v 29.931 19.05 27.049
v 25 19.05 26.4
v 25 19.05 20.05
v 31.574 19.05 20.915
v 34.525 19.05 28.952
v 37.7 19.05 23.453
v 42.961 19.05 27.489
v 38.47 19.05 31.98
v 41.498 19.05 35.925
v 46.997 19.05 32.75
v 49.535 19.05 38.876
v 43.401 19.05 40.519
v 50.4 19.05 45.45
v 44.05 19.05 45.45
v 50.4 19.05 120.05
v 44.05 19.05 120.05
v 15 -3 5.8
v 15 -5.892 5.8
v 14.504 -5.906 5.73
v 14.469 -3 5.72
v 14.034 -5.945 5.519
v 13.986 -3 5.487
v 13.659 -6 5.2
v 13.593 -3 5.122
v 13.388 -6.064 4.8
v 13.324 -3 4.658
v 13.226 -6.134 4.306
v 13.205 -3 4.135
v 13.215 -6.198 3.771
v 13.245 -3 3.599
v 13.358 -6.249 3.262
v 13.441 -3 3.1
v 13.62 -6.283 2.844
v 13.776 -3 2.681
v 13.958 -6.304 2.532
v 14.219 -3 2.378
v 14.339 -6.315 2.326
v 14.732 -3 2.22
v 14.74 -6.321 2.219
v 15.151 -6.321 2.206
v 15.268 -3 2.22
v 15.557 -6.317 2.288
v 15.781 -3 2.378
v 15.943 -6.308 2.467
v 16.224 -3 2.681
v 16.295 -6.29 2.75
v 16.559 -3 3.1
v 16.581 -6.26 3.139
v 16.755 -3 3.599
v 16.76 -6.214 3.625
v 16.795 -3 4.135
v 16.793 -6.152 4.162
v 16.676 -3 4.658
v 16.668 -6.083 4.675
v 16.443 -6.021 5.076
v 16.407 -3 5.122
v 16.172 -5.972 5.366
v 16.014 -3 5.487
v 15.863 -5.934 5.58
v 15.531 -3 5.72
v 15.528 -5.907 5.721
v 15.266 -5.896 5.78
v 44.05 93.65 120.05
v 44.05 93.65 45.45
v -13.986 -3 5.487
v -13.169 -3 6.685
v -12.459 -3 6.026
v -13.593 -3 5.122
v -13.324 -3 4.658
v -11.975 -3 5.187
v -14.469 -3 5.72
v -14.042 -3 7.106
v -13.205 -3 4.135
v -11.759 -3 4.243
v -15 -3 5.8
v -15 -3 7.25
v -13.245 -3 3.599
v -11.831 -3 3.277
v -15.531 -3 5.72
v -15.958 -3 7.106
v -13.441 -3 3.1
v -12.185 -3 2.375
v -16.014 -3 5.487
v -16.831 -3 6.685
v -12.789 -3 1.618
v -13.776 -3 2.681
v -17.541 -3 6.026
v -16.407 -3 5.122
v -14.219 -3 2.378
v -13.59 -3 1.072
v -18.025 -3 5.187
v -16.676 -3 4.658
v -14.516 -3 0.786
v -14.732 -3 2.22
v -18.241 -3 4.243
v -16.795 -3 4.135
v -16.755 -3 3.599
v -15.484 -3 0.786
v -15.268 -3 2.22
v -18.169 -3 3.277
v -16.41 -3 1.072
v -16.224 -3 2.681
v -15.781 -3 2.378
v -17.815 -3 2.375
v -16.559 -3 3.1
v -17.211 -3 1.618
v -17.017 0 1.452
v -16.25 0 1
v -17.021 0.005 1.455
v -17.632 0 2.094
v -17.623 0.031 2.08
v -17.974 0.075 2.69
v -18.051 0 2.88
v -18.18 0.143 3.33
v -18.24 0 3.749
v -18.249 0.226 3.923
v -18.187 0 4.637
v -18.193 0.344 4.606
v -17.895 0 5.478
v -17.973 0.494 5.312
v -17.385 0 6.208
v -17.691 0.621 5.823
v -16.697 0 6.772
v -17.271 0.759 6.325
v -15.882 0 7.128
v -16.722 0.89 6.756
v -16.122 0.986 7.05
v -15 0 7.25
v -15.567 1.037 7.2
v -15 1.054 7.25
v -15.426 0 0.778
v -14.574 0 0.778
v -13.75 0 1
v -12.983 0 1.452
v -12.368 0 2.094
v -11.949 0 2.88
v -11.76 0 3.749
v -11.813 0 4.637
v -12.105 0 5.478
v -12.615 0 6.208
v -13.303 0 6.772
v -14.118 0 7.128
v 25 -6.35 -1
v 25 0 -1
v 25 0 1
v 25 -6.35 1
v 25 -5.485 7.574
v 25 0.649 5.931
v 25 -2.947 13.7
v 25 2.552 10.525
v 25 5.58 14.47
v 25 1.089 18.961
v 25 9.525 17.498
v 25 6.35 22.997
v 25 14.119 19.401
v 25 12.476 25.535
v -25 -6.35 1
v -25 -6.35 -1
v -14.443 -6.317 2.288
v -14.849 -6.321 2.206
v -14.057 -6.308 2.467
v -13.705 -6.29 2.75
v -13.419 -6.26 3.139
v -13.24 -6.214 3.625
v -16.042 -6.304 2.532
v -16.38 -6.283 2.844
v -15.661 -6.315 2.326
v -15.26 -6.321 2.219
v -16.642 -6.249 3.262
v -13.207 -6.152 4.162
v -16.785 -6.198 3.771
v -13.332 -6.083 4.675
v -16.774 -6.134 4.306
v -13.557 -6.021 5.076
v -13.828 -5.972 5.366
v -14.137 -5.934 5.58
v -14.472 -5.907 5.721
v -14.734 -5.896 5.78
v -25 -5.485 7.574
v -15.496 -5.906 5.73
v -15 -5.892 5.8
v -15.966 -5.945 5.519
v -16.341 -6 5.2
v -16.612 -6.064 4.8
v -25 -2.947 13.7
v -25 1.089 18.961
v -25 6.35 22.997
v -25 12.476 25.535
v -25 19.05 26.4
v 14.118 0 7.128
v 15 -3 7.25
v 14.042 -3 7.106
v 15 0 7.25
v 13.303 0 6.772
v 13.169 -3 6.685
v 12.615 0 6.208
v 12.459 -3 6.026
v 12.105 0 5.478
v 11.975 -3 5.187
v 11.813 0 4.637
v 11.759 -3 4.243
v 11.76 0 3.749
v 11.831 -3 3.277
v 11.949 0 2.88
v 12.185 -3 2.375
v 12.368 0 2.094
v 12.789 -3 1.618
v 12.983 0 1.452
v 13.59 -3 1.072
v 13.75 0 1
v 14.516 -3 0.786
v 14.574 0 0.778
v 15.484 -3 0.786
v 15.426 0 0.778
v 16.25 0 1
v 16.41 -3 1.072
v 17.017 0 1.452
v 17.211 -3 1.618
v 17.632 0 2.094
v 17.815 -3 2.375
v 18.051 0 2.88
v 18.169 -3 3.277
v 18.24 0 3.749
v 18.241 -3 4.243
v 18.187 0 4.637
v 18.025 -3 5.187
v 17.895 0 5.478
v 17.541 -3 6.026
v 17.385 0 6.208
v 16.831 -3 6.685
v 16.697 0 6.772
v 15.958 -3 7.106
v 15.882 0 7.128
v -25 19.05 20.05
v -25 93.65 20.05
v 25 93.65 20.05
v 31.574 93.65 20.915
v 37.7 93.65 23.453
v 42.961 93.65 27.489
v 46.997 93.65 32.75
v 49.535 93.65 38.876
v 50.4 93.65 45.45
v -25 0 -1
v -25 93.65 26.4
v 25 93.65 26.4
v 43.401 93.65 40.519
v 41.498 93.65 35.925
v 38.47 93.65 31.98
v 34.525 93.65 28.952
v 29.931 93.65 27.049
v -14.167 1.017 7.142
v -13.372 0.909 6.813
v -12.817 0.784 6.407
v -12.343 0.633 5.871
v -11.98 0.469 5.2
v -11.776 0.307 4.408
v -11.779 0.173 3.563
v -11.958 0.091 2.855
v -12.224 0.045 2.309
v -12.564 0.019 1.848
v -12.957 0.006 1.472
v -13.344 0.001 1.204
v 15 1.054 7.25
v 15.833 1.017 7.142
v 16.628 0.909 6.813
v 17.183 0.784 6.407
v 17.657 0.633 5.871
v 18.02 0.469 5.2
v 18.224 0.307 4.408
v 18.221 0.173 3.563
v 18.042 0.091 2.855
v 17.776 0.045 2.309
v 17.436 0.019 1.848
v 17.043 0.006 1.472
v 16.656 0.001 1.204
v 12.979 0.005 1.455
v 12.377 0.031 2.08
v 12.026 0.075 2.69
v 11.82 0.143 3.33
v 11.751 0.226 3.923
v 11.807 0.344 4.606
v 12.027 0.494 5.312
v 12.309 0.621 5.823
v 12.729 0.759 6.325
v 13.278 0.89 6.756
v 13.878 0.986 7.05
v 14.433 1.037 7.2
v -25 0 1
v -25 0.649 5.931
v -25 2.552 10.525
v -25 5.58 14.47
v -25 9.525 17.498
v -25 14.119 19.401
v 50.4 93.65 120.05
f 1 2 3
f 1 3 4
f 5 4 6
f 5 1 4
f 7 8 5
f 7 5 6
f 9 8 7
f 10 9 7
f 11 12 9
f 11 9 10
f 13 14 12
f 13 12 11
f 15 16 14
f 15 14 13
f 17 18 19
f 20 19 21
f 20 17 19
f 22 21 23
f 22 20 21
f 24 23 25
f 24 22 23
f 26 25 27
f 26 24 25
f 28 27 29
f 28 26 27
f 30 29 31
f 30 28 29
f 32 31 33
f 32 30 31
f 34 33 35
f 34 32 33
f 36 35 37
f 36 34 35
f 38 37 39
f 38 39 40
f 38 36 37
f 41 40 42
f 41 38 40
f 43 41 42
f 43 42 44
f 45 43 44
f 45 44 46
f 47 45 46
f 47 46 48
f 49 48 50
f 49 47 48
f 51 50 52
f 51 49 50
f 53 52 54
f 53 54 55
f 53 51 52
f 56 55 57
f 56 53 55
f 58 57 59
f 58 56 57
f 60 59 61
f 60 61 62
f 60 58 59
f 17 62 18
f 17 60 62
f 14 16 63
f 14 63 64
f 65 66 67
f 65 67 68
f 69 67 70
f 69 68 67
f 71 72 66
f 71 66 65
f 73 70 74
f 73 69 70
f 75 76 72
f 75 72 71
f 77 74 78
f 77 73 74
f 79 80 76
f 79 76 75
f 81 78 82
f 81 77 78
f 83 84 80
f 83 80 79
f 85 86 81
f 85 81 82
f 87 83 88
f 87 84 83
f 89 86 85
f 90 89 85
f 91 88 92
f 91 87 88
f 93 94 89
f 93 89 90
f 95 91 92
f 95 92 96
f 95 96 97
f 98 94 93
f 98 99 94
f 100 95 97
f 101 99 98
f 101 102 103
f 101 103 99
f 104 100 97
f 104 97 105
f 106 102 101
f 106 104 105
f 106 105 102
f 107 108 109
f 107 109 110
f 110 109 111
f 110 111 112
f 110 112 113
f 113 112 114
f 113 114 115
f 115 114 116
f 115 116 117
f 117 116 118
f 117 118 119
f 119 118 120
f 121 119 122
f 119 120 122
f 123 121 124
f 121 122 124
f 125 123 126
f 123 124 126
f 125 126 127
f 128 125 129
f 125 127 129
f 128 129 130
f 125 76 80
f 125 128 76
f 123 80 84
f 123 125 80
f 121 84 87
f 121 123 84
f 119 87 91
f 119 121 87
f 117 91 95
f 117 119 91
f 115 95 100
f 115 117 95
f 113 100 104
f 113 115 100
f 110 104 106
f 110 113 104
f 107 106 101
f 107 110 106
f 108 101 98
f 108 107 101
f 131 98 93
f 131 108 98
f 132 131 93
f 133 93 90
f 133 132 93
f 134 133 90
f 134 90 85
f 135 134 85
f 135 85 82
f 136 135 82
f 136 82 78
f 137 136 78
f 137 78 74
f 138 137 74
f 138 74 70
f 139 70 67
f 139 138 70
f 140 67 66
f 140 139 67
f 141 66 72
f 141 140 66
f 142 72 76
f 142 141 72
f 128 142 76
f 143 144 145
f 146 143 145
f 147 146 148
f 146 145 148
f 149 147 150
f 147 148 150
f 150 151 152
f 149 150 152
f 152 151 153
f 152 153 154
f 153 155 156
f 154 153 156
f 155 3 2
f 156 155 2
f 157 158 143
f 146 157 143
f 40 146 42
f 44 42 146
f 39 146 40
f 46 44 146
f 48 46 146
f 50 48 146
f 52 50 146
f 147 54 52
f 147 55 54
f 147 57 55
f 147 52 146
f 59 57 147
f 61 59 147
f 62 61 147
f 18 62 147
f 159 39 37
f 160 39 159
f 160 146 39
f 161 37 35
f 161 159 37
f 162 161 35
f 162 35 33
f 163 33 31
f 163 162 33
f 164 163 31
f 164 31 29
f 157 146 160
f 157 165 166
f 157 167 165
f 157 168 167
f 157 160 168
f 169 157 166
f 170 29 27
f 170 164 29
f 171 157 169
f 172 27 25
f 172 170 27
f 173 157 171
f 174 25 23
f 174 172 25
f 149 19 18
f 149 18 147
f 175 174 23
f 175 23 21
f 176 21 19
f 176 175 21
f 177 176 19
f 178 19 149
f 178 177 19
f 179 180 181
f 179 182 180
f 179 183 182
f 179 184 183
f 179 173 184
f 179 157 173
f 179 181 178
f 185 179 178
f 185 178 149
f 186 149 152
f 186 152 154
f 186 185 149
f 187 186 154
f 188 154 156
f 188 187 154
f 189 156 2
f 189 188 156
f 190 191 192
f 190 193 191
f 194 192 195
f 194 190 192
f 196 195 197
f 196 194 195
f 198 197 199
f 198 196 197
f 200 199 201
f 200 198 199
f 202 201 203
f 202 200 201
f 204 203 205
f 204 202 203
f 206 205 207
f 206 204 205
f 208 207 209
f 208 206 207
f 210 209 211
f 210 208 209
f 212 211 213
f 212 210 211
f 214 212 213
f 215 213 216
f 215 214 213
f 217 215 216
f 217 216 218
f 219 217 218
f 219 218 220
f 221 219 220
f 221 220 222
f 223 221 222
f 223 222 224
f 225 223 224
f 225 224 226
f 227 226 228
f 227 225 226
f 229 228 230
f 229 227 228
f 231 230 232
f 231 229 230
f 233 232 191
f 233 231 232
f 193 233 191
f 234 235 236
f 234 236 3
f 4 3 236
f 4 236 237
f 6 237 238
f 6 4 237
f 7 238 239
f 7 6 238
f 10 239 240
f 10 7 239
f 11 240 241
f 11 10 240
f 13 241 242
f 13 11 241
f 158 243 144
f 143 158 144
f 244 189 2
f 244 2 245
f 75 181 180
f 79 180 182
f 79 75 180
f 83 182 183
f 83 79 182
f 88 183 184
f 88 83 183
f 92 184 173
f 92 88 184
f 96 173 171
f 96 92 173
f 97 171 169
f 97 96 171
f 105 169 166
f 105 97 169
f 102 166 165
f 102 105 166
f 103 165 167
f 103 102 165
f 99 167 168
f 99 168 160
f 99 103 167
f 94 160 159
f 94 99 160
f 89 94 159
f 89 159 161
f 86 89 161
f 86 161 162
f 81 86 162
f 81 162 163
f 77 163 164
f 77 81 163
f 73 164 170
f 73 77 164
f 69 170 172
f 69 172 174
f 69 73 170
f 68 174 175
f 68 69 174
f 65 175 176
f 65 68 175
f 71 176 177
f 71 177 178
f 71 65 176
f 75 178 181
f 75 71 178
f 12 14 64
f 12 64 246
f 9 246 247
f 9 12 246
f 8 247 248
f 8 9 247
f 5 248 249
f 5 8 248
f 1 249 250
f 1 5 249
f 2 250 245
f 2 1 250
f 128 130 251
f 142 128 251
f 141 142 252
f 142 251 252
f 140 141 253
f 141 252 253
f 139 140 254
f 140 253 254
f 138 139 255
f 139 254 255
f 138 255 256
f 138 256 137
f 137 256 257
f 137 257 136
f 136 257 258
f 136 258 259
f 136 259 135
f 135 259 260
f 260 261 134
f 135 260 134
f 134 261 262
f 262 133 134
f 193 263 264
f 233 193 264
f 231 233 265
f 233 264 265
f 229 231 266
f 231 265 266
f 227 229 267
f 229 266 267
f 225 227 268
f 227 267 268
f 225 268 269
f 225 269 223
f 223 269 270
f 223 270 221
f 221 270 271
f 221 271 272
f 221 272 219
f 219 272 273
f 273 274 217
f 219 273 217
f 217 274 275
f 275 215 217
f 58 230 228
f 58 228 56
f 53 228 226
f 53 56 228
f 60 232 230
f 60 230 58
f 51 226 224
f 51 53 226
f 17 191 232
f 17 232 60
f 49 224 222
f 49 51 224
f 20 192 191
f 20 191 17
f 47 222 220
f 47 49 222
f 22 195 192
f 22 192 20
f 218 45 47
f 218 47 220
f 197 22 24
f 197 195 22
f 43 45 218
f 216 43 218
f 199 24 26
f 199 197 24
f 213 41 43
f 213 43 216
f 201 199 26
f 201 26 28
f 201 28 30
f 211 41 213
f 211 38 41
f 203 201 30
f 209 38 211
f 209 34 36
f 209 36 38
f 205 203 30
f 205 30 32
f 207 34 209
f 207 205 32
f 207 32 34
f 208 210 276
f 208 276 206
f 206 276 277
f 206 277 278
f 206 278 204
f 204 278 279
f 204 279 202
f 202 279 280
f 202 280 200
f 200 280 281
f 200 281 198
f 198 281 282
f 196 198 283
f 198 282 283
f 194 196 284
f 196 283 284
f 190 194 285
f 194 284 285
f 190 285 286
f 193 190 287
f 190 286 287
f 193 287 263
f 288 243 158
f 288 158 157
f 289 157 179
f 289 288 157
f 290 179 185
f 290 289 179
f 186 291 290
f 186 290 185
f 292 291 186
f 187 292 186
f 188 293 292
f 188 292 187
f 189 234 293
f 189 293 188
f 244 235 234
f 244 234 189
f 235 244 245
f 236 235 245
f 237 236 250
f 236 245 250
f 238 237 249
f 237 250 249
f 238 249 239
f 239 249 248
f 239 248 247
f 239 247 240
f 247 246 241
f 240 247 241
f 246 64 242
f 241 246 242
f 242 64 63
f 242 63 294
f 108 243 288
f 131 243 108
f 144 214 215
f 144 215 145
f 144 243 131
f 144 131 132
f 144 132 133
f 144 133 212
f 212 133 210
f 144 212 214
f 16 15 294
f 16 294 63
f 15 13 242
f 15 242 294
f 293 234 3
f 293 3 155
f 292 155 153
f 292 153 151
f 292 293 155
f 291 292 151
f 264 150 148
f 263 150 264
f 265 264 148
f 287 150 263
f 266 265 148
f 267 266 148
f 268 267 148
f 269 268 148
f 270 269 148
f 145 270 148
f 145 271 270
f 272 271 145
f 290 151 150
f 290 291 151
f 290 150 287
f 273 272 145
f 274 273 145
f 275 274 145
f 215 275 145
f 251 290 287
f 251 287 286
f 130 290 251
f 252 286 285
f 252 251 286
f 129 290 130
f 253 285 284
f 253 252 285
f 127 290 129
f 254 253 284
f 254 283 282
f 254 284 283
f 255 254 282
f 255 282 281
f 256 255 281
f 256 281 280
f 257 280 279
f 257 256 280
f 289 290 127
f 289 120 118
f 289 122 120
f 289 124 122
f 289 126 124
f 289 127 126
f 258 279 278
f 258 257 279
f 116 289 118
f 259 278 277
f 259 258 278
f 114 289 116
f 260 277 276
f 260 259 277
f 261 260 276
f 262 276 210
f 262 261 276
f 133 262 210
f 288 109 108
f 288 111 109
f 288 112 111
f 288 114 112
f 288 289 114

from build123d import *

# Parameters (mm, degrees)
SKETCH1_W                     = 50
SKETCH1_H                     = 2
BASE_FLANGE1_DEPTH            = 6.35
EDGE_FLANGE2_DEPTH            = 50
CBORE_FOR_M3_SHCS1_AT_2_COUNT = 2
CBORE_FOR_M3_SHCS1_AT_2_PITCH = 30
EDGE_FLANGE3_DEPTH            = 74.6
CUT_EXTRUDE2_START            = 10
SKETCH23_R                    = 3.25
CUT_EXTRUDE2_DEPTH            = 10


# Sheet-metal steps are written as plain solids
with BuildPart() as part:
    # Sketch1 → Base-Flange1 (new body)
    with BuildSketch(Plane(origin=(0, 0, 0), x_dir=(1, 0, 0), z_dir=(0, 1, 0))):
        Rectangle(SKETCH1_W, SKETCH1_H)
    extrude(amount=-BASE_FLANGE1_DEPTH)

    # Edge-Flange2 section (across the edge) → Edge-Flange2 (add)
    with BuildSketch(Plane(origin=(-25, 0, 20.05), x_dir=(0, 0, -1), z_dir=(1, 0, 0))):
        with BuildLine():
            Line((-6.35, 19.05), (-6.35, 93.65))
            Line((-6.35, 93.65), (0, 93.65))
            Line((0, 93.65), (0, 19.05))
            ThreePointArc((0, 19.05), (5.579615818, 5.579615818), (19.05, 0))
            Line((19.05, 0), (19.05, -6.35))
            ThreePointArc((19.05, -6.35), (1.089487758, 1.089487758), (-6.35, 19.05))
        make_face()
    extrude(amount=EDGE_FLANGE2_DEPTH)

    # Sketch19 → CBORE for M3 SHCS1 (revolve, cut)
    with BuildSketch(Plane(origin=(-15, 0, 4), x_dir=(0, 0, 1), z_dir=(1, 0, 0))):
        Polygon((0, 0), (0, 6.35), (1.8, 6.35), (1.8, 3), (3.25, 3), (3.25, 0), align=None)
    cbore_for_m3_shcs1 = revolve(axis=Axis((-15, 6.35, 4), (0, -1, 0)), mode=Mode.SUBTRACT)

    # CBORE for M3 SHCS1 at 2: CBORE for M3 SHCS1 ×2
    with Locations(*[(i * CBORE_FOR_M3_SHCS1_AT_2_PITCH, 0, 0) for i in range(1, CBORE_FOR_M3_SHCS1_AT_2_COUNT)]):
        add(cbore_for_m3_shcs1, mode=Mode.SUBTRACT)

    # Edge-Flange3 section (across the edge) → Edge-Flange3 (add)
    with BuildSketch(Plane(origin=(44.05, 19.05, 26.4), x_dir=(-1, 0, 0), z_dir=(0, 1, 0))):
        with BuildLine():
            Line((-6.35, 19.05), (-6.35, 93.65))
            Line((-6.35, 93.65), (0, 93.65))
            Line((0, 93.65), (0, 19.05))
            ThreePointArc((0, 19.05), (5.579615818, 5.579615818), (19.05, 0))
            Line((19.05, 0), (19.05, -6.35))
            ThreePointArc((19.05, -6.35), (1.089487758, 1.089487758), (-6.35, 19.05))
        make_face()
    extrude(amount=EDGE_FLANGE3_DEPTH)

    # Sketch23 → Cut-Extrude2 (cut)
    with BuildSketch(Plane(origin=(0, 0, 0), x_dir=(1, 0, 0), z_dir=(0, 1, 0)).offset(CUT_EXTRUDE2_START)):
        with Locations(Location((15, -4, 0), (0, 0, 270))):
            Circle(SKETCH23_R)
        with Locations(Location((-15, -4, 0), (0, 0, 270))):
            Circle(SKETCH23_R)
    extrude(amount=-CUT_EXTRUDE2_DEPTH, mode=Mode.SUBTRACT)


solid = part.part
